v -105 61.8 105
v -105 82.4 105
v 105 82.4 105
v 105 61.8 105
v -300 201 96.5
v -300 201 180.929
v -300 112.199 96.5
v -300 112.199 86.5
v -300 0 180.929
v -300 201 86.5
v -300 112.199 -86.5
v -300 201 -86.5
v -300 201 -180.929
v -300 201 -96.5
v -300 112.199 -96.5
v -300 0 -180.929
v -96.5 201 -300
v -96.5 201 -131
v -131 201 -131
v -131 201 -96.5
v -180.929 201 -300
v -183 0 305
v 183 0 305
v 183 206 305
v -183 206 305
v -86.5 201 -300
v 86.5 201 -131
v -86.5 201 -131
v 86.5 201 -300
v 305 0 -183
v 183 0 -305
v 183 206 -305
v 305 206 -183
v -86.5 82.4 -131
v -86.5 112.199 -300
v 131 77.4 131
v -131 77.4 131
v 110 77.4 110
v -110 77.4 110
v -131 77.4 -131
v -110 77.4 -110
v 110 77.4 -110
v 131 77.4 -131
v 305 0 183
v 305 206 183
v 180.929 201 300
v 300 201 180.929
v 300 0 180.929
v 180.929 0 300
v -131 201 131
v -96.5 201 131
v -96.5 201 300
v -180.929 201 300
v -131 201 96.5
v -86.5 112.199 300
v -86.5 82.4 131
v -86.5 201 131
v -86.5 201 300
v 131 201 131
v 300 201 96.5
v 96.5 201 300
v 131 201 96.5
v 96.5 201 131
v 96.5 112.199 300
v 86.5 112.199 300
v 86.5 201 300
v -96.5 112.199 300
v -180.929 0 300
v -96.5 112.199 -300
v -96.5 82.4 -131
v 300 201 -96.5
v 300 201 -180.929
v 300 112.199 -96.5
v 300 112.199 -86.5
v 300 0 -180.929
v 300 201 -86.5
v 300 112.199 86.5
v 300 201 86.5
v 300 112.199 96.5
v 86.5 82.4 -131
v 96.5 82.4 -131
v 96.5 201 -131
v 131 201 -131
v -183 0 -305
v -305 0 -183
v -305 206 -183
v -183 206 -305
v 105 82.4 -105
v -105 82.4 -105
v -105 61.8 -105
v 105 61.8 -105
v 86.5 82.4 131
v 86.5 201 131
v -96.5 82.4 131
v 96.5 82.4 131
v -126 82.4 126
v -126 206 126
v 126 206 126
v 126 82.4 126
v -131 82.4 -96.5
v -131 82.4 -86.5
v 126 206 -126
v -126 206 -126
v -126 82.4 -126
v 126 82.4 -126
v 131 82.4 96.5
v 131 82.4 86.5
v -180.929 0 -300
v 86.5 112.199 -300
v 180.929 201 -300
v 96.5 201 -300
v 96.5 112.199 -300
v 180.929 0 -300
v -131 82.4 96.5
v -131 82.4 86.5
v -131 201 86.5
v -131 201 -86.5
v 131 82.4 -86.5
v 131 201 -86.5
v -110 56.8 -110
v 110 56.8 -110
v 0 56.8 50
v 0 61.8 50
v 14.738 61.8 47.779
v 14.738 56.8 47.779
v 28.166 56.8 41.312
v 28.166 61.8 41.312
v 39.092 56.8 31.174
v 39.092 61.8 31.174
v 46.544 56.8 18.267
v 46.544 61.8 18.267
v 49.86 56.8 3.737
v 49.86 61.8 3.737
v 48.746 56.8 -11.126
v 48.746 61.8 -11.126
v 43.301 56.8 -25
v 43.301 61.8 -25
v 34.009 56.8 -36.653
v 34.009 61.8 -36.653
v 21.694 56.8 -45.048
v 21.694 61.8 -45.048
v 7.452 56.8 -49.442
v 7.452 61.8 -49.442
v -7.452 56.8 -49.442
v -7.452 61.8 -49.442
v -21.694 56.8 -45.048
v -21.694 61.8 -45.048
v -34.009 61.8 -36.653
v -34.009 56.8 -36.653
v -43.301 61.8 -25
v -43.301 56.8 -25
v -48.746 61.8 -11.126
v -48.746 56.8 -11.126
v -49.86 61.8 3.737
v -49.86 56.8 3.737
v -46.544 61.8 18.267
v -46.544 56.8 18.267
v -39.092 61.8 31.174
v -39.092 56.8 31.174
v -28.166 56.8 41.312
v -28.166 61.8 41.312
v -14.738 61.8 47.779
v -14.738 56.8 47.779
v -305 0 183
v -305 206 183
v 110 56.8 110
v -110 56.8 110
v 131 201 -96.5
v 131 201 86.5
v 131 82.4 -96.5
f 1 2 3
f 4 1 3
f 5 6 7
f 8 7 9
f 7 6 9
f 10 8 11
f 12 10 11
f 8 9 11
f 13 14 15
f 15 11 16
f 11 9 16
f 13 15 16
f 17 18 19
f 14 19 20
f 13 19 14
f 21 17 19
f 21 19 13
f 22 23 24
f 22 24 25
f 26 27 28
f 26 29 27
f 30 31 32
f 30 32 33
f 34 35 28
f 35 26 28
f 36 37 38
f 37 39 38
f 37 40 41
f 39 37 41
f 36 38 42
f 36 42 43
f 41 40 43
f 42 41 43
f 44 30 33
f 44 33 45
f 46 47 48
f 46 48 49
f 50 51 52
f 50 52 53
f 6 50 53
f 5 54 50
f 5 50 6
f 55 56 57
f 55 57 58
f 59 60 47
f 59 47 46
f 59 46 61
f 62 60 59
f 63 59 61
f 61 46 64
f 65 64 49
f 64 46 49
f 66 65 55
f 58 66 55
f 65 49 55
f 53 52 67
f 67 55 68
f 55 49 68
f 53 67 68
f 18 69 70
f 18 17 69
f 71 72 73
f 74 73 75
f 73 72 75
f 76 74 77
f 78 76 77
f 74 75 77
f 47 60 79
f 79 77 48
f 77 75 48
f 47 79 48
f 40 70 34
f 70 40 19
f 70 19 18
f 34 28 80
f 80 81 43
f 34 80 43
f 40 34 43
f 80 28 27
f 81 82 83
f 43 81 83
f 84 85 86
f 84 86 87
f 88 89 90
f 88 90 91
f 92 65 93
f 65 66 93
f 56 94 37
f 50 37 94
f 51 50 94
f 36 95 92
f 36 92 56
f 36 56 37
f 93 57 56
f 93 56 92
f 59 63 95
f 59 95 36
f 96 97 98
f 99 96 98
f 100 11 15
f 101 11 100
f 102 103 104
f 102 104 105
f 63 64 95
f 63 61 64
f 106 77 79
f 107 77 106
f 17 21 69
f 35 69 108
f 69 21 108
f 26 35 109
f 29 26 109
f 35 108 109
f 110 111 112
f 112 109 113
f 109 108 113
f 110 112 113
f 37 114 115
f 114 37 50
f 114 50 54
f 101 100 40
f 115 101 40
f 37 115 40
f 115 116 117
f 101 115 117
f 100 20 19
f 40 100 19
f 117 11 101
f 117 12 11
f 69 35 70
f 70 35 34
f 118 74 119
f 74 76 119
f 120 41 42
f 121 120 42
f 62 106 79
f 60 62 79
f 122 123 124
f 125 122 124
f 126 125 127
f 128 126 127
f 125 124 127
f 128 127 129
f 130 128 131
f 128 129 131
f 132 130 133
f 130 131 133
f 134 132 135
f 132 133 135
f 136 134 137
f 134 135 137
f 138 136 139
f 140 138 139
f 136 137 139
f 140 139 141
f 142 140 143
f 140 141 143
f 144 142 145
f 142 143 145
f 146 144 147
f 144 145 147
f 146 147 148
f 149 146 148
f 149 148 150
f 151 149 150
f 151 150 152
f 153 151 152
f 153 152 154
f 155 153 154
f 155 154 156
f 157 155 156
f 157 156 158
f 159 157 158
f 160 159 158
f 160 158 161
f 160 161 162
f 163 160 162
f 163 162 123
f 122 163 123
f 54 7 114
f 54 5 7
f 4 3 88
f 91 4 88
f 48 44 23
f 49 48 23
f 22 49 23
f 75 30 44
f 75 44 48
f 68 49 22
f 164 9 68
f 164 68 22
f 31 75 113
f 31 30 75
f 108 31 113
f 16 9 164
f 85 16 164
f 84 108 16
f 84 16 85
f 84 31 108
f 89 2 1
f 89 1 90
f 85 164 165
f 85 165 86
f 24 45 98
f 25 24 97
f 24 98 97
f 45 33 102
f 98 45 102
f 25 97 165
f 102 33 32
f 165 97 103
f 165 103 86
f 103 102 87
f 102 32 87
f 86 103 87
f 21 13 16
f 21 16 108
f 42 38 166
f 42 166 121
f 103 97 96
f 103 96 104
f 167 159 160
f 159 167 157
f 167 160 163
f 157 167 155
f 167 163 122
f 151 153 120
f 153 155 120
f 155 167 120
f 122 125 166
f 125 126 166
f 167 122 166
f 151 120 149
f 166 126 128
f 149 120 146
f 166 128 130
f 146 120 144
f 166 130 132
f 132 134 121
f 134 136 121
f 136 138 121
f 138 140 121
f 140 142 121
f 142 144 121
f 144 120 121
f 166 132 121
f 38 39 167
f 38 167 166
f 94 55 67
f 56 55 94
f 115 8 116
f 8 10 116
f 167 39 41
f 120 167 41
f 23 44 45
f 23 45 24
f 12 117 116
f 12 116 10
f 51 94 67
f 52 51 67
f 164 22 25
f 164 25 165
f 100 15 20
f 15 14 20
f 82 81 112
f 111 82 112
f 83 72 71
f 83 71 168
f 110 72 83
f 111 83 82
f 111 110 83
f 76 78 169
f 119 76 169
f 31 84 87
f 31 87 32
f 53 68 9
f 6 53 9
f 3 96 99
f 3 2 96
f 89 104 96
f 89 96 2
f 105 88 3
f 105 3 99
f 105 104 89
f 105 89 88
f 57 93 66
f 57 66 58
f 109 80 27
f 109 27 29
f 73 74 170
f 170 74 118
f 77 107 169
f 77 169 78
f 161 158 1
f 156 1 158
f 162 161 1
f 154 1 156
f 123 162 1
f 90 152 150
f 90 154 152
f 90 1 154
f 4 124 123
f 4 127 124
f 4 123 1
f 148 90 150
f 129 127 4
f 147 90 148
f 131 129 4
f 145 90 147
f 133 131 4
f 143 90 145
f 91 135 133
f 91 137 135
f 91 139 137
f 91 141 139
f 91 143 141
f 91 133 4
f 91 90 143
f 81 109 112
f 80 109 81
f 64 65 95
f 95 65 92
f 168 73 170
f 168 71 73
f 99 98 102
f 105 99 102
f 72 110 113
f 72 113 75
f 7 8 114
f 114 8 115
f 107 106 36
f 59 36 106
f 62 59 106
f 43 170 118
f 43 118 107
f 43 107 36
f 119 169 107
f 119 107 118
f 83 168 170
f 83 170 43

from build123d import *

# Parameters (mm, degrees)
EXTRUDE_1_DEPTH                    = 206
SKETCH_3_W                         = 252
SKETCH_3_H                         = 252
CUT_EXTRUDE_1_DEPTH                = 123.6
SKETCH_5_W                         = 210
SKETCH_5_H                         = 210
CUT_EXTRUDE_5_DEPTH                = 20.6
SHELL_9_T                          = -5
SKETCH_6_R                         = 50
CUT_EXTRUDE_6_DEPTH                = 455.80065963
RIB_1_REACH                        = 542.993
SKETCH_7_WALL_W                    = 1255.59277199
SKETCH_7_WALL_H                    = 10
PATTERN_CIRCULAR_1_COUNT           = 4
PATTERN_CIRCULAR_1_COPY_1_REACH    = 542.993
PATTERN_CIRCULAR_1_COPY_1_SKETCH_W = 1255.59277199
PATTERN_CIRCULAR_1_COPY_1_SKETCH_H = 10
PATTERN_CIRCULAR_1_COPY_2_REACH    = 542.993
PATTERN_CIRCULAR_1_COPY_2_SKETCH_W = 1255.59277199
PATTERN_CIRCULAR_1_COPY_2_SKETCH_H = 10
PATTERN_CIRCULAR_1_COPY_3_REACH    = 542.993
PATTERN_CIRCULAR_1_COPY_3_SKETCH_W = 1255.59277199
PATTERN_CIRCULAR_1_COPY_3_SKETCH_H = 10


with BuildPart() as part:
    # 草图1 → 凸台-拉伸1 (new body)
    with BuildSketch(Plane(origin=(0, 0, 0), x_dir=(1, 0, 0), z_dir=(0, 1, 0))):
        Polygon((-305, 183), (-183, 305), (183, 305), (305, 183), (305, -183), (183, -305), (-183, -305), (-305, -183), align=None)
    extrude(amount=EXTRUDE_1_DEPTH)

    # 草图3 → 切除-拉伸1 (cut)
    with BuildSketch(Plane(origin=(0, 206, 0), x_dir=(1, 0, 0), z_dir=(0, 1, 0))):
        Rectangle(SKETCH_3_W, SKETCH_3_H)
    extrude(amount=-CUT_EXTRUDE_1_DEPTH, mode=Mode.SUBTRACT)

    # 草图5 → 切除-拉伸5 (cut)
    with BuildSketch(Plane(origin=(0, 82.4, 0), x_dir=(1, 0, 0), z_dir=(0, 1, 0))):
        Rectangle(SKETCH_5_W, SKETCH_5_H)
    extrude(amount=-CUT_EXTRUDE_5_DEPTH, mode=Mode.SUBTRACT)

    # 抽壳9
    shell_9_openings = [part.faces().sort_by_distance(p)[0] for p in [
        (0, 0, 0),
    ]]
    offset(amount=SHELL_9_T, openings=shell_9_openings, kind=Kind.INTERSECTION)

    # 草图6 → 切除-拉伸6 (cut, through all)
    with BuildSketch(Plane(origin=(0, 61.8, 0), x_dir=(1, 0, 0), z_dir=(0, 1, 0))):
        Circle(SKETCH_6_R)
    extrude(amount=-CUT_EXTRUDE_6_DEPTH, mode=Mode.SUBTRACT)

    # 草图7 wall → 筋1 (add, up to next)
    with BuildSketch(Plane(origin=(-215.5, 97.29962987, 91.5), x_dir=(-0.984807753012, 0.173648177668, 0), z_dir=(-0.173648177668, -0.984807753012, 0)), mode=Mode.PRIVATE) as rib_1_sk1:
        Rectangle(SKETCH_7_WALL_W, SKETCH_7_WALL_H)
    rib_1_tool1 = extrude(rib_1_sk1.sketch, amount=-RIB_1_REACH, mode=Mode.PRIVATE) - part.part
    rib_1 = rib_1_tool1.solids().sort_by_distance((-215.5, 97.29962987, 91.5))[0]
    add(rib_1)

    # 镜向1: 筋1 across plane
    add(rib_1.mirror(Plane.XY))

    # 阵列(圆周)1: 筋1 ×4 about axis
    pattern_circular_1_axis = Axis((0, 56.8, 0), (0, -1, 0))
    for i in range(1, PATTERN_CIRCULAR_1_COUNT):
        add(rib_1.rotate(pattern_circular_1_axis, i * 360 / PATTERN_CIRCULAR_1_COUNT))

    # 阵列(圆周)1 copy 1 sketch → 阵列(圆周)1 copy 1 (add, up to next)
    with BuildSketch(Plane(origin=(91.5, 97.29962987, -215.5), x_dir=(0, 0.173648177668, -0.984807753012), z_dir=(0, -0.984807753012, -0.173648177668)), mode=Mode.PRIVATE) as pattern_circular_1_copy_1_sk1:
        Rectangle(PATTERN_CIRCULAR_1_COPY_1_SKETCH_W, PATTERN_CIRCULAR_1_COPY_1_SKETCH_H)
    pattern_circular_1_copy_1_tool1 = extrude(pattern_circular_1_copy_1_sk1.sketch, amount=-PATTERN_CIRCULAR_1_COPY_1_REACH, mode=Mode.PRIVATE) - part.part
    add(pattern_circular_1_copy_1_tool1.solids().sort_by_distance((91.5, 97.29962987, -215.5))[0])

    # 阵列(圆周)1 copy 2 sketch → 阵列(圆周)1 copy 2 (add, up to next)
    with BuildSketch(Plane(origin=(215.5, 97.29962987, 91.5), x_dir=(0.984807753012, 0.173648177668, 0), z_dir=(0.173648177668, -0.984807753012, 0)), mode=Mode.PRIVATE) as pattern_circular_1_copy_2_sk1:
        Rectangle(PATTERN_CIRCULAR_1_COPY_2_SKETCH_W, PATTERN_CIRCULAR_1_COPY_2_SKETCH_H)
    pattern_circular_1_copy_2_tool1 = extrude(pattern_circular_1_copy_2_sk1.sketch, amount=-PATTERN_CIRCULAR_1_COPY_2_REACH, mode=Mode.PRIVATE) - part.part
    add(pattern_circular_1_copy_2_tool1.solids().sort_by_distance((215.5, 97.29962987, 91.5))[0])

    # 阵列(圆周)1 copy 3 sketch → 阵列(圆周)1 copy 3 (add, up to next)
    with BuildSketch(Plane(origin=(-91.5, 97.29962987, 215.5), x_dir=(0, 0.173648177668, 0.984807753012), z_dir=(0, -0.984807753012, 0.173648177668)), mode=Mode.PRIVATE) as pattern_circular_1_copy_3_sk1:
        Rectangle(PATTERN_CIRCULAR_1_COPY_3_SKETCH_W, PATTERN_CIRCULAR_1_COPY_3_SKETCH_H)
    pattern_circular_1_copy_3_tool1 = extrude(pattern_circular_1_copy_3_sk1.sketch, amount=-PATTERN_CIRCULAR_1_COPY_3_REACH, mode=Mode.PRIVATE) - part.part
    add(pattern_circular_1_copy_3_tool1.solids().sort_by_distance((-91.5, 97.29962987, 215.5))[0])


solid = part.part
